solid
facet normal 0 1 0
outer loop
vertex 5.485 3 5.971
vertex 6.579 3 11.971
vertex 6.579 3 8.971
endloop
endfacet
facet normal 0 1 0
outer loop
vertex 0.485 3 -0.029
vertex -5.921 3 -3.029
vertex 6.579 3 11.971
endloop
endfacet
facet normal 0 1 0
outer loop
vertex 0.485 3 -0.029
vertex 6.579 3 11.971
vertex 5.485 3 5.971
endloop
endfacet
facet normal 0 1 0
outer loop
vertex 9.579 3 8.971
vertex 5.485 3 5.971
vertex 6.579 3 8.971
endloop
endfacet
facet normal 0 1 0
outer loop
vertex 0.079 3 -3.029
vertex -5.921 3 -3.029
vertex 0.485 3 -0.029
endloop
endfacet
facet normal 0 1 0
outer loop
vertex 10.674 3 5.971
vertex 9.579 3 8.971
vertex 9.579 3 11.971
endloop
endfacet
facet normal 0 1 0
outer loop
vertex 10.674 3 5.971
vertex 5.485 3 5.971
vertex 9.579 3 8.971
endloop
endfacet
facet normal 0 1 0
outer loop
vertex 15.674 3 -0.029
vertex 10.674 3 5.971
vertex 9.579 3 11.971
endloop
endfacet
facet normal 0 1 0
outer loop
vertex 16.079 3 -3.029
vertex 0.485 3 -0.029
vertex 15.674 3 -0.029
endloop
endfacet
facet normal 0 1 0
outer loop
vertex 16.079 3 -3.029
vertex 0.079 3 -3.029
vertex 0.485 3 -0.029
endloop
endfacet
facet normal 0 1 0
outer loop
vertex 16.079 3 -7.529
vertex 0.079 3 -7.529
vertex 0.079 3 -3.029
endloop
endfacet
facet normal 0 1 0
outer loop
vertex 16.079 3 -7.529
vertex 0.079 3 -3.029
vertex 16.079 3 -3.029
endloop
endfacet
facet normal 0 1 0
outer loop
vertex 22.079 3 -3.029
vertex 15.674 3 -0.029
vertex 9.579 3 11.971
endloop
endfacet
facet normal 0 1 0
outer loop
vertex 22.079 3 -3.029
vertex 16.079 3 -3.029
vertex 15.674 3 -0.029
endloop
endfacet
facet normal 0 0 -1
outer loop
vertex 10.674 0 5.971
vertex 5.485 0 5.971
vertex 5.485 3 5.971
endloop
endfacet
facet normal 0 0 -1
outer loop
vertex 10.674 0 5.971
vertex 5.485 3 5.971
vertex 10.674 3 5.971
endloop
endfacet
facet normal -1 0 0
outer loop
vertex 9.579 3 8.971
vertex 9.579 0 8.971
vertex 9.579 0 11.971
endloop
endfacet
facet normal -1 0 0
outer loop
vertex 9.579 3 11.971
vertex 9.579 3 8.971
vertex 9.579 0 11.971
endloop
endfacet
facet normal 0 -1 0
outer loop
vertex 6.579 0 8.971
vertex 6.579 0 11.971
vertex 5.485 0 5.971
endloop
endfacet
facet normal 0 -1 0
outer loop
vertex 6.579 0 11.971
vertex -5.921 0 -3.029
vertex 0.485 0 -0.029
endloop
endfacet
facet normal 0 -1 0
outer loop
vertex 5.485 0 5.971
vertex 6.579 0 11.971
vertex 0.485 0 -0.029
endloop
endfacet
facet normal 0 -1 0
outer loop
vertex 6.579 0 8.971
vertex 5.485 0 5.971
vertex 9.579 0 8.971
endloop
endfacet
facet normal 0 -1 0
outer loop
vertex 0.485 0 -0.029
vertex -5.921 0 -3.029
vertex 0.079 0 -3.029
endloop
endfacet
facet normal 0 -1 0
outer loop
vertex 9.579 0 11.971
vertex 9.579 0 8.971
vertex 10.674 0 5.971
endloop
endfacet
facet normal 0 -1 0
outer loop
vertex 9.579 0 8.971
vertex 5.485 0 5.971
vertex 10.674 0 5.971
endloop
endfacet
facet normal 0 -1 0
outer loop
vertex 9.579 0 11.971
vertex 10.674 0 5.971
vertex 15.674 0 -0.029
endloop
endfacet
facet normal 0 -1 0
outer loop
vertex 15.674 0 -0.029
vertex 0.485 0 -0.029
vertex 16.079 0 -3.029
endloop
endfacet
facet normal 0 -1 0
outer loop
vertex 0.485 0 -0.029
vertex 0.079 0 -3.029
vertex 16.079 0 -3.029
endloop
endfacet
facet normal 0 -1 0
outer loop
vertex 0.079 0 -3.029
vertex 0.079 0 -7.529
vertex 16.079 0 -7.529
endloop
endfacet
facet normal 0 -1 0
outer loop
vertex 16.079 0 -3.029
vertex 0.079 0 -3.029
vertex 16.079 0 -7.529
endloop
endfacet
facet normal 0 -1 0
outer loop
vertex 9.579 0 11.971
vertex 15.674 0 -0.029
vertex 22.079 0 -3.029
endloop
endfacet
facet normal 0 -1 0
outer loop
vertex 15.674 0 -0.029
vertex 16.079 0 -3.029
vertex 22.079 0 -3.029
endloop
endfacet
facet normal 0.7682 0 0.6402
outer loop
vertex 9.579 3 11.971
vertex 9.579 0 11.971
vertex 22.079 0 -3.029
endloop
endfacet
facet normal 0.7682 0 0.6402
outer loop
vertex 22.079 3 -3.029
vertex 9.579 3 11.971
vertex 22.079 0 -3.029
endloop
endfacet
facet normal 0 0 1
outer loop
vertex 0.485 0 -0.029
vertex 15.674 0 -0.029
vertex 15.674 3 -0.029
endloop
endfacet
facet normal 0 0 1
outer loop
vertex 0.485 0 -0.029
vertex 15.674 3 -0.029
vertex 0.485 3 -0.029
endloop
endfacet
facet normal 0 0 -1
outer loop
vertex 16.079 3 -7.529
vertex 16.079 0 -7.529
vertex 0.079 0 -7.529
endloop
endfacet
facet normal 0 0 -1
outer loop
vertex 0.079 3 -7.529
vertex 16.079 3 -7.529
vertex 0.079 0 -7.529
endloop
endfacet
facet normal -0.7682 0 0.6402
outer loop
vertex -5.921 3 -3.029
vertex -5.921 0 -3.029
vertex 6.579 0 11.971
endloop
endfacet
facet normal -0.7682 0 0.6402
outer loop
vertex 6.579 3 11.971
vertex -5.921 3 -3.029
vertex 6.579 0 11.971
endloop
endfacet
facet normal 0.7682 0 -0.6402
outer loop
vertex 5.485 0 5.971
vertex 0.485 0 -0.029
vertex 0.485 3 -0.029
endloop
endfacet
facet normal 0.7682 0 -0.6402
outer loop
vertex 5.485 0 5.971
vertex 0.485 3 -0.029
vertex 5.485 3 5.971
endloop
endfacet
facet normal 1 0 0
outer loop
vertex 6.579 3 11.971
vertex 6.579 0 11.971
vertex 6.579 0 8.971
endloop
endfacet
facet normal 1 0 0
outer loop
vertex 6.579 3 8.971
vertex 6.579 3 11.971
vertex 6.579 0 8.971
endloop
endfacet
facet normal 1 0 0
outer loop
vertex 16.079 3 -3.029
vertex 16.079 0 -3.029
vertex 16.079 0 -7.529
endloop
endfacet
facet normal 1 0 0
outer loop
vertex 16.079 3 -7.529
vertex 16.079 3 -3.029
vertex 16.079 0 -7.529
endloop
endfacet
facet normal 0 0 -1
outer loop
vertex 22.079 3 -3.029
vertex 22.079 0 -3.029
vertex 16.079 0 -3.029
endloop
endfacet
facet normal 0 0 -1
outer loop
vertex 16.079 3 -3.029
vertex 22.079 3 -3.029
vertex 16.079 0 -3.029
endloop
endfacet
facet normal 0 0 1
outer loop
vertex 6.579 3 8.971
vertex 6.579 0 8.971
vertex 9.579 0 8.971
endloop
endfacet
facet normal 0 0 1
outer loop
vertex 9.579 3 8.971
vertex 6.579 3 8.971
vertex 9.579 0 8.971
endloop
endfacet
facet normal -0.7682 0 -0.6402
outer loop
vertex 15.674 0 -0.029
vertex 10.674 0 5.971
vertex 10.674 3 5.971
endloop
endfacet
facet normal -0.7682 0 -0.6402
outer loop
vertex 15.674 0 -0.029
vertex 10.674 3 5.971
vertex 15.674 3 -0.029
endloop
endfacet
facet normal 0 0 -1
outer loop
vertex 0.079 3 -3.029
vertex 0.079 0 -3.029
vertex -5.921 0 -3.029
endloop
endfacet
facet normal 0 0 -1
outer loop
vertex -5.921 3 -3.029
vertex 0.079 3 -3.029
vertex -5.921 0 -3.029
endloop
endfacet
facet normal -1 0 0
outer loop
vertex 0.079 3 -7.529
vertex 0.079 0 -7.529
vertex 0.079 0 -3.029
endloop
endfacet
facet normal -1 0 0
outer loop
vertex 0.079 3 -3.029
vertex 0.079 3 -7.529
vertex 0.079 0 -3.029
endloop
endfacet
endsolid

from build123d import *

# Parameters (mm, degrees)
BOSS_EXTRUDE1_DEPTH = 3


with BuildPart() as part:
    # Sketch1 → Boss-Extrude1 (new body)
    with BuildSketch(Plane(origin=(0, 0, 0), x_dir=(1, 0, 0), z_dir=(0, 1, 0))):
        Polygon((22.079481216, 3.028725772), (16.079481216, 3.028725772), (16.079481216, 7.528725772), (0.079481216, 7.528725772), (0.079481216, 3.028725772), (-5.920518784, 3.028725772), (6.579481216, -11.971274228), (6.579481216, -8.971274228), (9.579481216, -8.971274228), (9.579481216, -11.971274228), align=None)
        Polygon((15.674356378, 0.028725772), (0.484606054, 0.028725772), (5.484606054, -5.971274228), (10.674356378, -5.971274228), align=None, mode=Mode.SUBTRACT)
    extrude(amount=BOSS_EXTRUDE1_DEPTH)


solid = part.part
